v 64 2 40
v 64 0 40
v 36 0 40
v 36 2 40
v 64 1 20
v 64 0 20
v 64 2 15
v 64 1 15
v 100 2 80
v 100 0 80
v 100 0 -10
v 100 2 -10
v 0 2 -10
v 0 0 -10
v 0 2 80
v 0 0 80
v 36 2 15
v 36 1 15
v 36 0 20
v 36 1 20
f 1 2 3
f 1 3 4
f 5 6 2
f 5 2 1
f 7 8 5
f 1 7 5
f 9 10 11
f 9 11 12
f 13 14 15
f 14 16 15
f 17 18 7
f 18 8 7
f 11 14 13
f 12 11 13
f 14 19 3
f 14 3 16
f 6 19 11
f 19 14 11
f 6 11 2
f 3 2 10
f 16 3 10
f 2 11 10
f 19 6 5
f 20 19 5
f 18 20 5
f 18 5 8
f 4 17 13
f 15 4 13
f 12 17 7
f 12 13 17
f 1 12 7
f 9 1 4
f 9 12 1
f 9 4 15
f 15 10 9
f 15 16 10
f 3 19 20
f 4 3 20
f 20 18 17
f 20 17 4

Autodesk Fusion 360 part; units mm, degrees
box "BoxPrimitive1" add length 90 width 100 height 2 placed x (0, 0, 1) y (1, 0, 0) z (0, 1, 0) at (0, 0, -10)
box "BoxPrimitive2" cut length 20 width 28 height -10 placed x (0, 0, -1) y (-1, 0, 0) z (0, 1, 0) at (64, 2, 40)
box "BoxPrimitive3" cut length 5 width 28 height -1 placed x (0, 0, -1) y (-1, 0, 0) z (0, 1, 0) at (64, 2, 20)
